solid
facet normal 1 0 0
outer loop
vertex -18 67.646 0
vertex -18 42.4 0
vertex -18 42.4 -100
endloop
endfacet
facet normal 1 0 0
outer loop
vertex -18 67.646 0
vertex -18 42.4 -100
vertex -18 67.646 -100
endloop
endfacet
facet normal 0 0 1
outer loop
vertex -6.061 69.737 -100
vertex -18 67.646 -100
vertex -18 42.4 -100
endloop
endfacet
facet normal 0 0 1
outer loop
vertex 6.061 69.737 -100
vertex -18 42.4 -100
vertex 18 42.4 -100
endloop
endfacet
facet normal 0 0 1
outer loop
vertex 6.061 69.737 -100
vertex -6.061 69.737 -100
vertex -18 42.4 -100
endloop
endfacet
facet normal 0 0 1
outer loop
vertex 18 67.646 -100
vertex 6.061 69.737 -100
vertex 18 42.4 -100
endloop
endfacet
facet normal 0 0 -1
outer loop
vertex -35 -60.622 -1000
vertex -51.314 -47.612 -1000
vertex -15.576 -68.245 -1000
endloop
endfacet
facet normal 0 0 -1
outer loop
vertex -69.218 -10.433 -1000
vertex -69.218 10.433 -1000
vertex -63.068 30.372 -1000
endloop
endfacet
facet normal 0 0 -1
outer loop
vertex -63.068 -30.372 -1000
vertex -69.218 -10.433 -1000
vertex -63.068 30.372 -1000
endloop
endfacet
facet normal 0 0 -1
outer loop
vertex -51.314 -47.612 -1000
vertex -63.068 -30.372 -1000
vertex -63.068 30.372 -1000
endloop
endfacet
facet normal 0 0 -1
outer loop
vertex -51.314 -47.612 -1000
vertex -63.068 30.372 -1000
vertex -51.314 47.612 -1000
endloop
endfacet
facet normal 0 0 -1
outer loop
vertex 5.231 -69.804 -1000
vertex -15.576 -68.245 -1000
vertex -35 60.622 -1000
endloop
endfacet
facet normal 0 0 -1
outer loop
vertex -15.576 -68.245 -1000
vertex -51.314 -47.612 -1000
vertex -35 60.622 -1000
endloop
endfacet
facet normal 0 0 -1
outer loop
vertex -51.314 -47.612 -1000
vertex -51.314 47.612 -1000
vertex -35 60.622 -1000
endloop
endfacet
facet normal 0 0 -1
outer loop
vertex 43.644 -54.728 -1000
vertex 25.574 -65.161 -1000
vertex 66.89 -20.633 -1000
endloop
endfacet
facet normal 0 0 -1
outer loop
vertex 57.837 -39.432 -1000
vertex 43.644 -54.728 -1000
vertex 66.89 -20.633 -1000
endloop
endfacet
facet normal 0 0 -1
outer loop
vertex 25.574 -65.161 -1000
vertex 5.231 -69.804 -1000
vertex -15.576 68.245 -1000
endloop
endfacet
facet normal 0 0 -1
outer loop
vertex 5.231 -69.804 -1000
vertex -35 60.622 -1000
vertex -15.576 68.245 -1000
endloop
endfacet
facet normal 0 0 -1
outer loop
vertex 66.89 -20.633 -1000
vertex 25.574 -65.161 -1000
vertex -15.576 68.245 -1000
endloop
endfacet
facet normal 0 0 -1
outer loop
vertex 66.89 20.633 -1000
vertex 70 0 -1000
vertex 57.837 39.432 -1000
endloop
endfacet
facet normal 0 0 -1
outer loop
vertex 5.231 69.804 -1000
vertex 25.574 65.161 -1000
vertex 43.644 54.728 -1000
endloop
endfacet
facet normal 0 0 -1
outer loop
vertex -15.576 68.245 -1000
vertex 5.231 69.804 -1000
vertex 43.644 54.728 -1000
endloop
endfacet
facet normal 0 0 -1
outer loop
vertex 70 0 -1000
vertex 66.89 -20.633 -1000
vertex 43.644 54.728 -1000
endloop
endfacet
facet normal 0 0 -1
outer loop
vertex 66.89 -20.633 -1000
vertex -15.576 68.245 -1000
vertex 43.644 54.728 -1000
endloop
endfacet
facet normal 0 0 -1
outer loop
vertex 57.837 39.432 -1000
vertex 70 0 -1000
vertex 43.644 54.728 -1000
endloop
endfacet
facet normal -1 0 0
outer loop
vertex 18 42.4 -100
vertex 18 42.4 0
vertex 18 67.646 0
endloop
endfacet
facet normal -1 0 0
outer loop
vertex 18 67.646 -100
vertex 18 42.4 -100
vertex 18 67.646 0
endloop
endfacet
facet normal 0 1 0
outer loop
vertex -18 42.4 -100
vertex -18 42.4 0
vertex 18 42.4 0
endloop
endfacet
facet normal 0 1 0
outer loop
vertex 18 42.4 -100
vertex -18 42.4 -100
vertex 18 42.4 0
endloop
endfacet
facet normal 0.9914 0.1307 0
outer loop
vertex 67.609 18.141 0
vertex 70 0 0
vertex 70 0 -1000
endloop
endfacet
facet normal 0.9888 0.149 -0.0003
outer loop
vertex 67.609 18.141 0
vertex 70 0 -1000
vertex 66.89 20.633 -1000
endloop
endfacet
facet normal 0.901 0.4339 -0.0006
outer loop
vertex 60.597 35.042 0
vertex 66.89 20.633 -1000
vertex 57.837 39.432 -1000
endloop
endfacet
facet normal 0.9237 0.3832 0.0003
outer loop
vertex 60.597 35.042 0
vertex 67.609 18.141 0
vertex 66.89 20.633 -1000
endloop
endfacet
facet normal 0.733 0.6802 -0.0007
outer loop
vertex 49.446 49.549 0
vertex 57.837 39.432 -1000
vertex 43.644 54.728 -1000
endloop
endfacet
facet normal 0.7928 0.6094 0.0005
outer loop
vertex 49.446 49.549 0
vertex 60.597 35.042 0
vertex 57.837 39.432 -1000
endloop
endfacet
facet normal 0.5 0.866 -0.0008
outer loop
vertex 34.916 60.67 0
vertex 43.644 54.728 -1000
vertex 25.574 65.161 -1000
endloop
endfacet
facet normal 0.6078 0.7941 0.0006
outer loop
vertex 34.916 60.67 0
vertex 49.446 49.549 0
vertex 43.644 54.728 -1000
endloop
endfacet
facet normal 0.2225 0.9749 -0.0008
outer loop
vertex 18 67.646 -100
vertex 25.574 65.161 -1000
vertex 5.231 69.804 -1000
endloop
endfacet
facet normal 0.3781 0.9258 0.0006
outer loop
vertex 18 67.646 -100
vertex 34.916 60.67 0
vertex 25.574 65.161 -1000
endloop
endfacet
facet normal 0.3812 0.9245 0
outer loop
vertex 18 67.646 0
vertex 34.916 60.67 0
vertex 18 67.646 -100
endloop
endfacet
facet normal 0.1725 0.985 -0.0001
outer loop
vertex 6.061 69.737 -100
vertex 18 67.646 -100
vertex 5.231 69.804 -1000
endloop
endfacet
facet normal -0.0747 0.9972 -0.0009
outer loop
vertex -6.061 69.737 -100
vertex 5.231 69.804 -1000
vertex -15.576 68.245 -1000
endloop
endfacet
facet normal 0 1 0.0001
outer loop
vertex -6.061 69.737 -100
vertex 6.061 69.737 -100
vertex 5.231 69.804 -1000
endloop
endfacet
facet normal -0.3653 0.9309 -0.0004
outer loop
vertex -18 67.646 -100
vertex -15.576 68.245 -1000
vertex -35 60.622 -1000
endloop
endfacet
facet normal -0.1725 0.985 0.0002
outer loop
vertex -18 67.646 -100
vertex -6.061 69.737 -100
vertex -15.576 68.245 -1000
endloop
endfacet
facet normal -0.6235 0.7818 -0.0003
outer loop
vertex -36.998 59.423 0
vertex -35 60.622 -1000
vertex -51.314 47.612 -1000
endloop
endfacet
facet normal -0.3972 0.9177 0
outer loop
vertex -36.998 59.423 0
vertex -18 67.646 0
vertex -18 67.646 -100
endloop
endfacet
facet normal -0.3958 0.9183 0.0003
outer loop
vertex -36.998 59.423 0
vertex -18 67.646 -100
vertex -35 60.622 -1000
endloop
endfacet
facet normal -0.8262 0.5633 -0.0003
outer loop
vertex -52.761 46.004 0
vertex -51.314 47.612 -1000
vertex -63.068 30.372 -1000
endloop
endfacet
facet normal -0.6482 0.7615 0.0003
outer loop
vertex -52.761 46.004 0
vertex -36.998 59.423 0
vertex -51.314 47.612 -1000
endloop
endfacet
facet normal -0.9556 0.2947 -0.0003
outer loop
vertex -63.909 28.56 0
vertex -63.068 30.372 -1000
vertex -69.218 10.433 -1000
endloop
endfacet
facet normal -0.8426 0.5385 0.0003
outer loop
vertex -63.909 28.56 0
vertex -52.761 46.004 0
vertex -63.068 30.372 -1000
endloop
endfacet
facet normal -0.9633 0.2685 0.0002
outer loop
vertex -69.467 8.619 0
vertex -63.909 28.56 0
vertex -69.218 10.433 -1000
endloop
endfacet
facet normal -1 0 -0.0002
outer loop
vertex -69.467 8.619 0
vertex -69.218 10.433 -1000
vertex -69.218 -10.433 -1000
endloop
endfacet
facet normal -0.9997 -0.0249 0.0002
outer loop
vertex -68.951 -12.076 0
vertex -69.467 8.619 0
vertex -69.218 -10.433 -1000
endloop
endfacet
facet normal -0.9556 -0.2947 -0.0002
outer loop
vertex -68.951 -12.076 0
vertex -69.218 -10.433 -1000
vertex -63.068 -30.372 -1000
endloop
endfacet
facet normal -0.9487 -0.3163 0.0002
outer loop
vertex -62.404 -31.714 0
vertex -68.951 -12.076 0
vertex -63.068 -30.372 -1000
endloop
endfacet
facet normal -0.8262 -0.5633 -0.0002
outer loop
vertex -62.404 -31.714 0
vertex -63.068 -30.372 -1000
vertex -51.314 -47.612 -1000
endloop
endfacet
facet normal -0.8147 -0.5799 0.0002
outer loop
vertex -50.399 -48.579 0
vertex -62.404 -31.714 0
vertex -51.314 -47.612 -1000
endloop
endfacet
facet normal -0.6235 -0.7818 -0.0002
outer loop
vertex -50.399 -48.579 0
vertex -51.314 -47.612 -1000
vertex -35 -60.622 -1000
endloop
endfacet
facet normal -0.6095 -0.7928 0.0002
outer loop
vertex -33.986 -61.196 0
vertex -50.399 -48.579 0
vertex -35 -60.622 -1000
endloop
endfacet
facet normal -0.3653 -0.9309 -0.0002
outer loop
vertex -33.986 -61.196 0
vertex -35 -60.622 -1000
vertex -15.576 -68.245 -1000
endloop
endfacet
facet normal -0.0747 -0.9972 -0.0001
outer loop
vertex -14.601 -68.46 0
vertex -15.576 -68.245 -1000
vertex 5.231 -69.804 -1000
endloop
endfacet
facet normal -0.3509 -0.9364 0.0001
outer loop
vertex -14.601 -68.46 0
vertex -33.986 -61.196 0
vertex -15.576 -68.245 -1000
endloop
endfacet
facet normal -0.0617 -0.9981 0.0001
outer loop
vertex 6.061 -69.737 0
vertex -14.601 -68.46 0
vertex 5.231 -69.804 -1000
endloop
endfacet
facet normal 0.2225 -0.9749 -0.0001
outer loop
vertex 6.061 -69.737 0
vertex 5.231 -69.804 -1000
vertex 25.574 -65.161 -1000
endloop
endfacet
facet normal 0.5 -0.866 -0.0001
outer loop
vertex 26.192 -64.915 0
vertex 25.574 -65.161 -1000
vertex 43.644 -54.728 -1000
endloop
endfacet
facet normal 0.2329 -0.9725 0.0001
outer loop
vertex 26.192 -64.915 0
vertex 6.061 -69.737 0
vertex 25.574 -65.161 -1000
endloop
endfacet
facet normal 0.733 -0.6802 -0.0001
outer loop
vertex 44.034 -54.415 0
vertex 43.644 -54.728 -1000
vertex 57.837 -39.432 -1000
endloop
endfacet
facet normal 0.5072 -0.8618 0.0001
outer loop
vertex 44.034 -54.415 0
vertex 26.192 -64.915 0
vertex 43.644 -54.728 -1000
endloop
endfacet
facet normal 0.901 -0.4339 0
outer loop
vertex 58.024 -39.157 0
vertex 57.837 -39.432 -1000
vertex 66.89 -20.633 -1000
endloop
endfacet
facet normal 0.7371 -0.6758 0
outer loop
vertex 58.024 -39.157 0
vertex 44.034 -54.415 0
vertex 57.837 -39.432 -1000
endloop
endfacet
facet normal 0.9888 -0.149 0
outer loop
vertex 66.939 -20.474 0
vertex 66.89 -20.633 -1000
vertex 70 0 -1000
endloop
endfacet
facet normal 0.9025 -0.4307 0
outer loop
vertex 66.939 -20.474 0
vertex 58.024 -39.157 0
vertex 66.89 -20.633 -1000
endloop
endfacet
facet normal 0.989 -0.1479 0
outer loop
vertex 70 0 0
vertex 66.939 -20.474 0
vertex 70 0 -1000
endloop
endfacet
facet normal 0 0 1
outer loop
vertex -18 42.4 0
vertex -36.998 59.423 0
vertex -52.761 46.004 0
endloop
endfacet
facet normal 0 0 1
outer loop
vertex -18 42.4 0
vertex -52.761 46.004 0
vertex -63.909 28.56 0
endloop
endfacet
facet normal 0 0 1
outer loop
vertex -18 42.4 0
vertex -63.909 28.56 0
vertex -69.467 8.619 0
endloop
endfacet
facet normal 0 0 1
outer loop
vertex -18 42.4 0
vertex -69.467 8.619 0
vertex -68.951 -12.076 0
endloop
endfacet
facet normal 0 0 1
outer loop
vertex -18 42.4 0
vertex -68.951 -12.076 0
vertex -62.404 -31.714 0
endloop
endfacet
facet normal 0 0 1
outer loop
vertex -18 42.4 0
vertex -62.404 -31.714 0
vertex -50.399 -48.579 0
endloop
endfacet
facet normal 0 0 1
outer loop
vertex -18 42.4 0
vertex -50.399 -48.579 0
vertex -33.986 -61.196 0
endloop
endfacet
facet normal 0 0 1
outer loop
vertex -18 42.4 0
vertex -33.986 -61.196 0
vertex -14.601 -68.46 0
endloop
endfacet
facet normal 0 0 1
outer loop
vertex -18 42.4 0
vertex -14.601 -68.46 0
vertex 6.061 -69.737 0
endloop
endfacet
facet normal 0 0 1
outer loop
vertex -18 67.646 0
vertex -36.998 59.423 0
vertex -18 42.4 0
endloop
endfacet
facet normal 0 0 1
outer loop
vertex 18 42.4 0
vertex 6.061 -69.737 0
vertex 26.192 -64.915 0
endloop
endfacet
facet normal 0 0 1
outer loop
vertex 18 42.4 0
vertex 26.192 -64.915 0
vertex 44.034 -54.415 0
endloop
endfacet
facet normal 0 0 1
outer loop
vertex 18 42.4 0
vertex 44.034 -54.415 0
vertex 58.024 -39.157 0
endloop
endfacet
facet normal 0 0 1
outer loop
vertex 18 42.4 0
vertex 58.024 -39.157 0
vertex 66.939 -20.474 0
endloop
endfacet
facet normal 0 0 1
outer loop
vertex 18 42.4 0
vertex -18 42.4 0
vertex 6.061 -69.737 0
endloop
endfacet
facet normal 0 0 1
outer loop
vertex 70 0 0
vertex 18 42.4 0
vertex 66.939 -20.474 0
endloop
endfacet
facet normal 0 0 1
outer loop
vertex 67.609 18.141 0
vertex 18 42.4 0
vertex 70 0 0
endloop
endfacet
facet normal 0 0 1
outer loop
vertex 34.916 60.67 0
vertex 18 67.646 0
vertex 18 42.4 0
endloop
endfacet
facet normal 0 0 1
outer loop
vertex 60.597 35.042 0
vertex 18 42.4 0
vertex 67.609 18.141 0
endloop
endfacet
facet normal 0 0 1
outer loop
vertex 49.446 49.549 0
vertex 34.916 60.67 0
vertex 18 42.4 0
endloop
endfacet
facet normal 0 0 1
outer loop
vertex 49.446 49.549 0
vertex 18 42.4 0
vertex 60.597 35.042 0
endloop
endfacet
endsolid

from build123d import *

# Parameters (mm, degrees)
SKETCH1_R           = 70
BOSS_EXTRUDE1_DEPTH = 1000
SKETCH3_W           = 36
SKETCH3_H           = 36
CUT_EXTRUDE1_DEPTH  = 100
EXTRUDE_THIN1_START = 50
SKETCH5_R           = 70
SKETCH5_R_2         = 69.9999
EXTRUDE_THIN1_DEPTH = 50


with BuildPart() as part:
    # Sketch1 → Boss-Extrude1 (new body)
    with BuildSketch(Plane.XY):
        Circle(SKETCH1_R)
    extrude(amount=-BOSS_EXTRUDE1_DEPTH)

    # Sketch3 → Cut-Extrude1 (cut)
    with BuildSketch(Plane.XY):
        with Locations((0, 60.4)):
            Rectangle(SKETCH3_W, SKETCH3_H)
    extrude(amount=-CUT_EXTRUDE1_DEPTH, mode=Mode.SUBTRACT)

    # Sketch5 → Extrude-Thin1 (add)
    with BuildSketch(Plane.XY.offset(-300).offset(EXTRUDE_THIN1_START)):
        Circle(SKETCH5_R)
        Circle(SKETCH5_R_2, mode=Mode.SUBTRACT)
    extrude(amount=-EXTRUDE_THIN1_DEPTH)


solid = part.part
